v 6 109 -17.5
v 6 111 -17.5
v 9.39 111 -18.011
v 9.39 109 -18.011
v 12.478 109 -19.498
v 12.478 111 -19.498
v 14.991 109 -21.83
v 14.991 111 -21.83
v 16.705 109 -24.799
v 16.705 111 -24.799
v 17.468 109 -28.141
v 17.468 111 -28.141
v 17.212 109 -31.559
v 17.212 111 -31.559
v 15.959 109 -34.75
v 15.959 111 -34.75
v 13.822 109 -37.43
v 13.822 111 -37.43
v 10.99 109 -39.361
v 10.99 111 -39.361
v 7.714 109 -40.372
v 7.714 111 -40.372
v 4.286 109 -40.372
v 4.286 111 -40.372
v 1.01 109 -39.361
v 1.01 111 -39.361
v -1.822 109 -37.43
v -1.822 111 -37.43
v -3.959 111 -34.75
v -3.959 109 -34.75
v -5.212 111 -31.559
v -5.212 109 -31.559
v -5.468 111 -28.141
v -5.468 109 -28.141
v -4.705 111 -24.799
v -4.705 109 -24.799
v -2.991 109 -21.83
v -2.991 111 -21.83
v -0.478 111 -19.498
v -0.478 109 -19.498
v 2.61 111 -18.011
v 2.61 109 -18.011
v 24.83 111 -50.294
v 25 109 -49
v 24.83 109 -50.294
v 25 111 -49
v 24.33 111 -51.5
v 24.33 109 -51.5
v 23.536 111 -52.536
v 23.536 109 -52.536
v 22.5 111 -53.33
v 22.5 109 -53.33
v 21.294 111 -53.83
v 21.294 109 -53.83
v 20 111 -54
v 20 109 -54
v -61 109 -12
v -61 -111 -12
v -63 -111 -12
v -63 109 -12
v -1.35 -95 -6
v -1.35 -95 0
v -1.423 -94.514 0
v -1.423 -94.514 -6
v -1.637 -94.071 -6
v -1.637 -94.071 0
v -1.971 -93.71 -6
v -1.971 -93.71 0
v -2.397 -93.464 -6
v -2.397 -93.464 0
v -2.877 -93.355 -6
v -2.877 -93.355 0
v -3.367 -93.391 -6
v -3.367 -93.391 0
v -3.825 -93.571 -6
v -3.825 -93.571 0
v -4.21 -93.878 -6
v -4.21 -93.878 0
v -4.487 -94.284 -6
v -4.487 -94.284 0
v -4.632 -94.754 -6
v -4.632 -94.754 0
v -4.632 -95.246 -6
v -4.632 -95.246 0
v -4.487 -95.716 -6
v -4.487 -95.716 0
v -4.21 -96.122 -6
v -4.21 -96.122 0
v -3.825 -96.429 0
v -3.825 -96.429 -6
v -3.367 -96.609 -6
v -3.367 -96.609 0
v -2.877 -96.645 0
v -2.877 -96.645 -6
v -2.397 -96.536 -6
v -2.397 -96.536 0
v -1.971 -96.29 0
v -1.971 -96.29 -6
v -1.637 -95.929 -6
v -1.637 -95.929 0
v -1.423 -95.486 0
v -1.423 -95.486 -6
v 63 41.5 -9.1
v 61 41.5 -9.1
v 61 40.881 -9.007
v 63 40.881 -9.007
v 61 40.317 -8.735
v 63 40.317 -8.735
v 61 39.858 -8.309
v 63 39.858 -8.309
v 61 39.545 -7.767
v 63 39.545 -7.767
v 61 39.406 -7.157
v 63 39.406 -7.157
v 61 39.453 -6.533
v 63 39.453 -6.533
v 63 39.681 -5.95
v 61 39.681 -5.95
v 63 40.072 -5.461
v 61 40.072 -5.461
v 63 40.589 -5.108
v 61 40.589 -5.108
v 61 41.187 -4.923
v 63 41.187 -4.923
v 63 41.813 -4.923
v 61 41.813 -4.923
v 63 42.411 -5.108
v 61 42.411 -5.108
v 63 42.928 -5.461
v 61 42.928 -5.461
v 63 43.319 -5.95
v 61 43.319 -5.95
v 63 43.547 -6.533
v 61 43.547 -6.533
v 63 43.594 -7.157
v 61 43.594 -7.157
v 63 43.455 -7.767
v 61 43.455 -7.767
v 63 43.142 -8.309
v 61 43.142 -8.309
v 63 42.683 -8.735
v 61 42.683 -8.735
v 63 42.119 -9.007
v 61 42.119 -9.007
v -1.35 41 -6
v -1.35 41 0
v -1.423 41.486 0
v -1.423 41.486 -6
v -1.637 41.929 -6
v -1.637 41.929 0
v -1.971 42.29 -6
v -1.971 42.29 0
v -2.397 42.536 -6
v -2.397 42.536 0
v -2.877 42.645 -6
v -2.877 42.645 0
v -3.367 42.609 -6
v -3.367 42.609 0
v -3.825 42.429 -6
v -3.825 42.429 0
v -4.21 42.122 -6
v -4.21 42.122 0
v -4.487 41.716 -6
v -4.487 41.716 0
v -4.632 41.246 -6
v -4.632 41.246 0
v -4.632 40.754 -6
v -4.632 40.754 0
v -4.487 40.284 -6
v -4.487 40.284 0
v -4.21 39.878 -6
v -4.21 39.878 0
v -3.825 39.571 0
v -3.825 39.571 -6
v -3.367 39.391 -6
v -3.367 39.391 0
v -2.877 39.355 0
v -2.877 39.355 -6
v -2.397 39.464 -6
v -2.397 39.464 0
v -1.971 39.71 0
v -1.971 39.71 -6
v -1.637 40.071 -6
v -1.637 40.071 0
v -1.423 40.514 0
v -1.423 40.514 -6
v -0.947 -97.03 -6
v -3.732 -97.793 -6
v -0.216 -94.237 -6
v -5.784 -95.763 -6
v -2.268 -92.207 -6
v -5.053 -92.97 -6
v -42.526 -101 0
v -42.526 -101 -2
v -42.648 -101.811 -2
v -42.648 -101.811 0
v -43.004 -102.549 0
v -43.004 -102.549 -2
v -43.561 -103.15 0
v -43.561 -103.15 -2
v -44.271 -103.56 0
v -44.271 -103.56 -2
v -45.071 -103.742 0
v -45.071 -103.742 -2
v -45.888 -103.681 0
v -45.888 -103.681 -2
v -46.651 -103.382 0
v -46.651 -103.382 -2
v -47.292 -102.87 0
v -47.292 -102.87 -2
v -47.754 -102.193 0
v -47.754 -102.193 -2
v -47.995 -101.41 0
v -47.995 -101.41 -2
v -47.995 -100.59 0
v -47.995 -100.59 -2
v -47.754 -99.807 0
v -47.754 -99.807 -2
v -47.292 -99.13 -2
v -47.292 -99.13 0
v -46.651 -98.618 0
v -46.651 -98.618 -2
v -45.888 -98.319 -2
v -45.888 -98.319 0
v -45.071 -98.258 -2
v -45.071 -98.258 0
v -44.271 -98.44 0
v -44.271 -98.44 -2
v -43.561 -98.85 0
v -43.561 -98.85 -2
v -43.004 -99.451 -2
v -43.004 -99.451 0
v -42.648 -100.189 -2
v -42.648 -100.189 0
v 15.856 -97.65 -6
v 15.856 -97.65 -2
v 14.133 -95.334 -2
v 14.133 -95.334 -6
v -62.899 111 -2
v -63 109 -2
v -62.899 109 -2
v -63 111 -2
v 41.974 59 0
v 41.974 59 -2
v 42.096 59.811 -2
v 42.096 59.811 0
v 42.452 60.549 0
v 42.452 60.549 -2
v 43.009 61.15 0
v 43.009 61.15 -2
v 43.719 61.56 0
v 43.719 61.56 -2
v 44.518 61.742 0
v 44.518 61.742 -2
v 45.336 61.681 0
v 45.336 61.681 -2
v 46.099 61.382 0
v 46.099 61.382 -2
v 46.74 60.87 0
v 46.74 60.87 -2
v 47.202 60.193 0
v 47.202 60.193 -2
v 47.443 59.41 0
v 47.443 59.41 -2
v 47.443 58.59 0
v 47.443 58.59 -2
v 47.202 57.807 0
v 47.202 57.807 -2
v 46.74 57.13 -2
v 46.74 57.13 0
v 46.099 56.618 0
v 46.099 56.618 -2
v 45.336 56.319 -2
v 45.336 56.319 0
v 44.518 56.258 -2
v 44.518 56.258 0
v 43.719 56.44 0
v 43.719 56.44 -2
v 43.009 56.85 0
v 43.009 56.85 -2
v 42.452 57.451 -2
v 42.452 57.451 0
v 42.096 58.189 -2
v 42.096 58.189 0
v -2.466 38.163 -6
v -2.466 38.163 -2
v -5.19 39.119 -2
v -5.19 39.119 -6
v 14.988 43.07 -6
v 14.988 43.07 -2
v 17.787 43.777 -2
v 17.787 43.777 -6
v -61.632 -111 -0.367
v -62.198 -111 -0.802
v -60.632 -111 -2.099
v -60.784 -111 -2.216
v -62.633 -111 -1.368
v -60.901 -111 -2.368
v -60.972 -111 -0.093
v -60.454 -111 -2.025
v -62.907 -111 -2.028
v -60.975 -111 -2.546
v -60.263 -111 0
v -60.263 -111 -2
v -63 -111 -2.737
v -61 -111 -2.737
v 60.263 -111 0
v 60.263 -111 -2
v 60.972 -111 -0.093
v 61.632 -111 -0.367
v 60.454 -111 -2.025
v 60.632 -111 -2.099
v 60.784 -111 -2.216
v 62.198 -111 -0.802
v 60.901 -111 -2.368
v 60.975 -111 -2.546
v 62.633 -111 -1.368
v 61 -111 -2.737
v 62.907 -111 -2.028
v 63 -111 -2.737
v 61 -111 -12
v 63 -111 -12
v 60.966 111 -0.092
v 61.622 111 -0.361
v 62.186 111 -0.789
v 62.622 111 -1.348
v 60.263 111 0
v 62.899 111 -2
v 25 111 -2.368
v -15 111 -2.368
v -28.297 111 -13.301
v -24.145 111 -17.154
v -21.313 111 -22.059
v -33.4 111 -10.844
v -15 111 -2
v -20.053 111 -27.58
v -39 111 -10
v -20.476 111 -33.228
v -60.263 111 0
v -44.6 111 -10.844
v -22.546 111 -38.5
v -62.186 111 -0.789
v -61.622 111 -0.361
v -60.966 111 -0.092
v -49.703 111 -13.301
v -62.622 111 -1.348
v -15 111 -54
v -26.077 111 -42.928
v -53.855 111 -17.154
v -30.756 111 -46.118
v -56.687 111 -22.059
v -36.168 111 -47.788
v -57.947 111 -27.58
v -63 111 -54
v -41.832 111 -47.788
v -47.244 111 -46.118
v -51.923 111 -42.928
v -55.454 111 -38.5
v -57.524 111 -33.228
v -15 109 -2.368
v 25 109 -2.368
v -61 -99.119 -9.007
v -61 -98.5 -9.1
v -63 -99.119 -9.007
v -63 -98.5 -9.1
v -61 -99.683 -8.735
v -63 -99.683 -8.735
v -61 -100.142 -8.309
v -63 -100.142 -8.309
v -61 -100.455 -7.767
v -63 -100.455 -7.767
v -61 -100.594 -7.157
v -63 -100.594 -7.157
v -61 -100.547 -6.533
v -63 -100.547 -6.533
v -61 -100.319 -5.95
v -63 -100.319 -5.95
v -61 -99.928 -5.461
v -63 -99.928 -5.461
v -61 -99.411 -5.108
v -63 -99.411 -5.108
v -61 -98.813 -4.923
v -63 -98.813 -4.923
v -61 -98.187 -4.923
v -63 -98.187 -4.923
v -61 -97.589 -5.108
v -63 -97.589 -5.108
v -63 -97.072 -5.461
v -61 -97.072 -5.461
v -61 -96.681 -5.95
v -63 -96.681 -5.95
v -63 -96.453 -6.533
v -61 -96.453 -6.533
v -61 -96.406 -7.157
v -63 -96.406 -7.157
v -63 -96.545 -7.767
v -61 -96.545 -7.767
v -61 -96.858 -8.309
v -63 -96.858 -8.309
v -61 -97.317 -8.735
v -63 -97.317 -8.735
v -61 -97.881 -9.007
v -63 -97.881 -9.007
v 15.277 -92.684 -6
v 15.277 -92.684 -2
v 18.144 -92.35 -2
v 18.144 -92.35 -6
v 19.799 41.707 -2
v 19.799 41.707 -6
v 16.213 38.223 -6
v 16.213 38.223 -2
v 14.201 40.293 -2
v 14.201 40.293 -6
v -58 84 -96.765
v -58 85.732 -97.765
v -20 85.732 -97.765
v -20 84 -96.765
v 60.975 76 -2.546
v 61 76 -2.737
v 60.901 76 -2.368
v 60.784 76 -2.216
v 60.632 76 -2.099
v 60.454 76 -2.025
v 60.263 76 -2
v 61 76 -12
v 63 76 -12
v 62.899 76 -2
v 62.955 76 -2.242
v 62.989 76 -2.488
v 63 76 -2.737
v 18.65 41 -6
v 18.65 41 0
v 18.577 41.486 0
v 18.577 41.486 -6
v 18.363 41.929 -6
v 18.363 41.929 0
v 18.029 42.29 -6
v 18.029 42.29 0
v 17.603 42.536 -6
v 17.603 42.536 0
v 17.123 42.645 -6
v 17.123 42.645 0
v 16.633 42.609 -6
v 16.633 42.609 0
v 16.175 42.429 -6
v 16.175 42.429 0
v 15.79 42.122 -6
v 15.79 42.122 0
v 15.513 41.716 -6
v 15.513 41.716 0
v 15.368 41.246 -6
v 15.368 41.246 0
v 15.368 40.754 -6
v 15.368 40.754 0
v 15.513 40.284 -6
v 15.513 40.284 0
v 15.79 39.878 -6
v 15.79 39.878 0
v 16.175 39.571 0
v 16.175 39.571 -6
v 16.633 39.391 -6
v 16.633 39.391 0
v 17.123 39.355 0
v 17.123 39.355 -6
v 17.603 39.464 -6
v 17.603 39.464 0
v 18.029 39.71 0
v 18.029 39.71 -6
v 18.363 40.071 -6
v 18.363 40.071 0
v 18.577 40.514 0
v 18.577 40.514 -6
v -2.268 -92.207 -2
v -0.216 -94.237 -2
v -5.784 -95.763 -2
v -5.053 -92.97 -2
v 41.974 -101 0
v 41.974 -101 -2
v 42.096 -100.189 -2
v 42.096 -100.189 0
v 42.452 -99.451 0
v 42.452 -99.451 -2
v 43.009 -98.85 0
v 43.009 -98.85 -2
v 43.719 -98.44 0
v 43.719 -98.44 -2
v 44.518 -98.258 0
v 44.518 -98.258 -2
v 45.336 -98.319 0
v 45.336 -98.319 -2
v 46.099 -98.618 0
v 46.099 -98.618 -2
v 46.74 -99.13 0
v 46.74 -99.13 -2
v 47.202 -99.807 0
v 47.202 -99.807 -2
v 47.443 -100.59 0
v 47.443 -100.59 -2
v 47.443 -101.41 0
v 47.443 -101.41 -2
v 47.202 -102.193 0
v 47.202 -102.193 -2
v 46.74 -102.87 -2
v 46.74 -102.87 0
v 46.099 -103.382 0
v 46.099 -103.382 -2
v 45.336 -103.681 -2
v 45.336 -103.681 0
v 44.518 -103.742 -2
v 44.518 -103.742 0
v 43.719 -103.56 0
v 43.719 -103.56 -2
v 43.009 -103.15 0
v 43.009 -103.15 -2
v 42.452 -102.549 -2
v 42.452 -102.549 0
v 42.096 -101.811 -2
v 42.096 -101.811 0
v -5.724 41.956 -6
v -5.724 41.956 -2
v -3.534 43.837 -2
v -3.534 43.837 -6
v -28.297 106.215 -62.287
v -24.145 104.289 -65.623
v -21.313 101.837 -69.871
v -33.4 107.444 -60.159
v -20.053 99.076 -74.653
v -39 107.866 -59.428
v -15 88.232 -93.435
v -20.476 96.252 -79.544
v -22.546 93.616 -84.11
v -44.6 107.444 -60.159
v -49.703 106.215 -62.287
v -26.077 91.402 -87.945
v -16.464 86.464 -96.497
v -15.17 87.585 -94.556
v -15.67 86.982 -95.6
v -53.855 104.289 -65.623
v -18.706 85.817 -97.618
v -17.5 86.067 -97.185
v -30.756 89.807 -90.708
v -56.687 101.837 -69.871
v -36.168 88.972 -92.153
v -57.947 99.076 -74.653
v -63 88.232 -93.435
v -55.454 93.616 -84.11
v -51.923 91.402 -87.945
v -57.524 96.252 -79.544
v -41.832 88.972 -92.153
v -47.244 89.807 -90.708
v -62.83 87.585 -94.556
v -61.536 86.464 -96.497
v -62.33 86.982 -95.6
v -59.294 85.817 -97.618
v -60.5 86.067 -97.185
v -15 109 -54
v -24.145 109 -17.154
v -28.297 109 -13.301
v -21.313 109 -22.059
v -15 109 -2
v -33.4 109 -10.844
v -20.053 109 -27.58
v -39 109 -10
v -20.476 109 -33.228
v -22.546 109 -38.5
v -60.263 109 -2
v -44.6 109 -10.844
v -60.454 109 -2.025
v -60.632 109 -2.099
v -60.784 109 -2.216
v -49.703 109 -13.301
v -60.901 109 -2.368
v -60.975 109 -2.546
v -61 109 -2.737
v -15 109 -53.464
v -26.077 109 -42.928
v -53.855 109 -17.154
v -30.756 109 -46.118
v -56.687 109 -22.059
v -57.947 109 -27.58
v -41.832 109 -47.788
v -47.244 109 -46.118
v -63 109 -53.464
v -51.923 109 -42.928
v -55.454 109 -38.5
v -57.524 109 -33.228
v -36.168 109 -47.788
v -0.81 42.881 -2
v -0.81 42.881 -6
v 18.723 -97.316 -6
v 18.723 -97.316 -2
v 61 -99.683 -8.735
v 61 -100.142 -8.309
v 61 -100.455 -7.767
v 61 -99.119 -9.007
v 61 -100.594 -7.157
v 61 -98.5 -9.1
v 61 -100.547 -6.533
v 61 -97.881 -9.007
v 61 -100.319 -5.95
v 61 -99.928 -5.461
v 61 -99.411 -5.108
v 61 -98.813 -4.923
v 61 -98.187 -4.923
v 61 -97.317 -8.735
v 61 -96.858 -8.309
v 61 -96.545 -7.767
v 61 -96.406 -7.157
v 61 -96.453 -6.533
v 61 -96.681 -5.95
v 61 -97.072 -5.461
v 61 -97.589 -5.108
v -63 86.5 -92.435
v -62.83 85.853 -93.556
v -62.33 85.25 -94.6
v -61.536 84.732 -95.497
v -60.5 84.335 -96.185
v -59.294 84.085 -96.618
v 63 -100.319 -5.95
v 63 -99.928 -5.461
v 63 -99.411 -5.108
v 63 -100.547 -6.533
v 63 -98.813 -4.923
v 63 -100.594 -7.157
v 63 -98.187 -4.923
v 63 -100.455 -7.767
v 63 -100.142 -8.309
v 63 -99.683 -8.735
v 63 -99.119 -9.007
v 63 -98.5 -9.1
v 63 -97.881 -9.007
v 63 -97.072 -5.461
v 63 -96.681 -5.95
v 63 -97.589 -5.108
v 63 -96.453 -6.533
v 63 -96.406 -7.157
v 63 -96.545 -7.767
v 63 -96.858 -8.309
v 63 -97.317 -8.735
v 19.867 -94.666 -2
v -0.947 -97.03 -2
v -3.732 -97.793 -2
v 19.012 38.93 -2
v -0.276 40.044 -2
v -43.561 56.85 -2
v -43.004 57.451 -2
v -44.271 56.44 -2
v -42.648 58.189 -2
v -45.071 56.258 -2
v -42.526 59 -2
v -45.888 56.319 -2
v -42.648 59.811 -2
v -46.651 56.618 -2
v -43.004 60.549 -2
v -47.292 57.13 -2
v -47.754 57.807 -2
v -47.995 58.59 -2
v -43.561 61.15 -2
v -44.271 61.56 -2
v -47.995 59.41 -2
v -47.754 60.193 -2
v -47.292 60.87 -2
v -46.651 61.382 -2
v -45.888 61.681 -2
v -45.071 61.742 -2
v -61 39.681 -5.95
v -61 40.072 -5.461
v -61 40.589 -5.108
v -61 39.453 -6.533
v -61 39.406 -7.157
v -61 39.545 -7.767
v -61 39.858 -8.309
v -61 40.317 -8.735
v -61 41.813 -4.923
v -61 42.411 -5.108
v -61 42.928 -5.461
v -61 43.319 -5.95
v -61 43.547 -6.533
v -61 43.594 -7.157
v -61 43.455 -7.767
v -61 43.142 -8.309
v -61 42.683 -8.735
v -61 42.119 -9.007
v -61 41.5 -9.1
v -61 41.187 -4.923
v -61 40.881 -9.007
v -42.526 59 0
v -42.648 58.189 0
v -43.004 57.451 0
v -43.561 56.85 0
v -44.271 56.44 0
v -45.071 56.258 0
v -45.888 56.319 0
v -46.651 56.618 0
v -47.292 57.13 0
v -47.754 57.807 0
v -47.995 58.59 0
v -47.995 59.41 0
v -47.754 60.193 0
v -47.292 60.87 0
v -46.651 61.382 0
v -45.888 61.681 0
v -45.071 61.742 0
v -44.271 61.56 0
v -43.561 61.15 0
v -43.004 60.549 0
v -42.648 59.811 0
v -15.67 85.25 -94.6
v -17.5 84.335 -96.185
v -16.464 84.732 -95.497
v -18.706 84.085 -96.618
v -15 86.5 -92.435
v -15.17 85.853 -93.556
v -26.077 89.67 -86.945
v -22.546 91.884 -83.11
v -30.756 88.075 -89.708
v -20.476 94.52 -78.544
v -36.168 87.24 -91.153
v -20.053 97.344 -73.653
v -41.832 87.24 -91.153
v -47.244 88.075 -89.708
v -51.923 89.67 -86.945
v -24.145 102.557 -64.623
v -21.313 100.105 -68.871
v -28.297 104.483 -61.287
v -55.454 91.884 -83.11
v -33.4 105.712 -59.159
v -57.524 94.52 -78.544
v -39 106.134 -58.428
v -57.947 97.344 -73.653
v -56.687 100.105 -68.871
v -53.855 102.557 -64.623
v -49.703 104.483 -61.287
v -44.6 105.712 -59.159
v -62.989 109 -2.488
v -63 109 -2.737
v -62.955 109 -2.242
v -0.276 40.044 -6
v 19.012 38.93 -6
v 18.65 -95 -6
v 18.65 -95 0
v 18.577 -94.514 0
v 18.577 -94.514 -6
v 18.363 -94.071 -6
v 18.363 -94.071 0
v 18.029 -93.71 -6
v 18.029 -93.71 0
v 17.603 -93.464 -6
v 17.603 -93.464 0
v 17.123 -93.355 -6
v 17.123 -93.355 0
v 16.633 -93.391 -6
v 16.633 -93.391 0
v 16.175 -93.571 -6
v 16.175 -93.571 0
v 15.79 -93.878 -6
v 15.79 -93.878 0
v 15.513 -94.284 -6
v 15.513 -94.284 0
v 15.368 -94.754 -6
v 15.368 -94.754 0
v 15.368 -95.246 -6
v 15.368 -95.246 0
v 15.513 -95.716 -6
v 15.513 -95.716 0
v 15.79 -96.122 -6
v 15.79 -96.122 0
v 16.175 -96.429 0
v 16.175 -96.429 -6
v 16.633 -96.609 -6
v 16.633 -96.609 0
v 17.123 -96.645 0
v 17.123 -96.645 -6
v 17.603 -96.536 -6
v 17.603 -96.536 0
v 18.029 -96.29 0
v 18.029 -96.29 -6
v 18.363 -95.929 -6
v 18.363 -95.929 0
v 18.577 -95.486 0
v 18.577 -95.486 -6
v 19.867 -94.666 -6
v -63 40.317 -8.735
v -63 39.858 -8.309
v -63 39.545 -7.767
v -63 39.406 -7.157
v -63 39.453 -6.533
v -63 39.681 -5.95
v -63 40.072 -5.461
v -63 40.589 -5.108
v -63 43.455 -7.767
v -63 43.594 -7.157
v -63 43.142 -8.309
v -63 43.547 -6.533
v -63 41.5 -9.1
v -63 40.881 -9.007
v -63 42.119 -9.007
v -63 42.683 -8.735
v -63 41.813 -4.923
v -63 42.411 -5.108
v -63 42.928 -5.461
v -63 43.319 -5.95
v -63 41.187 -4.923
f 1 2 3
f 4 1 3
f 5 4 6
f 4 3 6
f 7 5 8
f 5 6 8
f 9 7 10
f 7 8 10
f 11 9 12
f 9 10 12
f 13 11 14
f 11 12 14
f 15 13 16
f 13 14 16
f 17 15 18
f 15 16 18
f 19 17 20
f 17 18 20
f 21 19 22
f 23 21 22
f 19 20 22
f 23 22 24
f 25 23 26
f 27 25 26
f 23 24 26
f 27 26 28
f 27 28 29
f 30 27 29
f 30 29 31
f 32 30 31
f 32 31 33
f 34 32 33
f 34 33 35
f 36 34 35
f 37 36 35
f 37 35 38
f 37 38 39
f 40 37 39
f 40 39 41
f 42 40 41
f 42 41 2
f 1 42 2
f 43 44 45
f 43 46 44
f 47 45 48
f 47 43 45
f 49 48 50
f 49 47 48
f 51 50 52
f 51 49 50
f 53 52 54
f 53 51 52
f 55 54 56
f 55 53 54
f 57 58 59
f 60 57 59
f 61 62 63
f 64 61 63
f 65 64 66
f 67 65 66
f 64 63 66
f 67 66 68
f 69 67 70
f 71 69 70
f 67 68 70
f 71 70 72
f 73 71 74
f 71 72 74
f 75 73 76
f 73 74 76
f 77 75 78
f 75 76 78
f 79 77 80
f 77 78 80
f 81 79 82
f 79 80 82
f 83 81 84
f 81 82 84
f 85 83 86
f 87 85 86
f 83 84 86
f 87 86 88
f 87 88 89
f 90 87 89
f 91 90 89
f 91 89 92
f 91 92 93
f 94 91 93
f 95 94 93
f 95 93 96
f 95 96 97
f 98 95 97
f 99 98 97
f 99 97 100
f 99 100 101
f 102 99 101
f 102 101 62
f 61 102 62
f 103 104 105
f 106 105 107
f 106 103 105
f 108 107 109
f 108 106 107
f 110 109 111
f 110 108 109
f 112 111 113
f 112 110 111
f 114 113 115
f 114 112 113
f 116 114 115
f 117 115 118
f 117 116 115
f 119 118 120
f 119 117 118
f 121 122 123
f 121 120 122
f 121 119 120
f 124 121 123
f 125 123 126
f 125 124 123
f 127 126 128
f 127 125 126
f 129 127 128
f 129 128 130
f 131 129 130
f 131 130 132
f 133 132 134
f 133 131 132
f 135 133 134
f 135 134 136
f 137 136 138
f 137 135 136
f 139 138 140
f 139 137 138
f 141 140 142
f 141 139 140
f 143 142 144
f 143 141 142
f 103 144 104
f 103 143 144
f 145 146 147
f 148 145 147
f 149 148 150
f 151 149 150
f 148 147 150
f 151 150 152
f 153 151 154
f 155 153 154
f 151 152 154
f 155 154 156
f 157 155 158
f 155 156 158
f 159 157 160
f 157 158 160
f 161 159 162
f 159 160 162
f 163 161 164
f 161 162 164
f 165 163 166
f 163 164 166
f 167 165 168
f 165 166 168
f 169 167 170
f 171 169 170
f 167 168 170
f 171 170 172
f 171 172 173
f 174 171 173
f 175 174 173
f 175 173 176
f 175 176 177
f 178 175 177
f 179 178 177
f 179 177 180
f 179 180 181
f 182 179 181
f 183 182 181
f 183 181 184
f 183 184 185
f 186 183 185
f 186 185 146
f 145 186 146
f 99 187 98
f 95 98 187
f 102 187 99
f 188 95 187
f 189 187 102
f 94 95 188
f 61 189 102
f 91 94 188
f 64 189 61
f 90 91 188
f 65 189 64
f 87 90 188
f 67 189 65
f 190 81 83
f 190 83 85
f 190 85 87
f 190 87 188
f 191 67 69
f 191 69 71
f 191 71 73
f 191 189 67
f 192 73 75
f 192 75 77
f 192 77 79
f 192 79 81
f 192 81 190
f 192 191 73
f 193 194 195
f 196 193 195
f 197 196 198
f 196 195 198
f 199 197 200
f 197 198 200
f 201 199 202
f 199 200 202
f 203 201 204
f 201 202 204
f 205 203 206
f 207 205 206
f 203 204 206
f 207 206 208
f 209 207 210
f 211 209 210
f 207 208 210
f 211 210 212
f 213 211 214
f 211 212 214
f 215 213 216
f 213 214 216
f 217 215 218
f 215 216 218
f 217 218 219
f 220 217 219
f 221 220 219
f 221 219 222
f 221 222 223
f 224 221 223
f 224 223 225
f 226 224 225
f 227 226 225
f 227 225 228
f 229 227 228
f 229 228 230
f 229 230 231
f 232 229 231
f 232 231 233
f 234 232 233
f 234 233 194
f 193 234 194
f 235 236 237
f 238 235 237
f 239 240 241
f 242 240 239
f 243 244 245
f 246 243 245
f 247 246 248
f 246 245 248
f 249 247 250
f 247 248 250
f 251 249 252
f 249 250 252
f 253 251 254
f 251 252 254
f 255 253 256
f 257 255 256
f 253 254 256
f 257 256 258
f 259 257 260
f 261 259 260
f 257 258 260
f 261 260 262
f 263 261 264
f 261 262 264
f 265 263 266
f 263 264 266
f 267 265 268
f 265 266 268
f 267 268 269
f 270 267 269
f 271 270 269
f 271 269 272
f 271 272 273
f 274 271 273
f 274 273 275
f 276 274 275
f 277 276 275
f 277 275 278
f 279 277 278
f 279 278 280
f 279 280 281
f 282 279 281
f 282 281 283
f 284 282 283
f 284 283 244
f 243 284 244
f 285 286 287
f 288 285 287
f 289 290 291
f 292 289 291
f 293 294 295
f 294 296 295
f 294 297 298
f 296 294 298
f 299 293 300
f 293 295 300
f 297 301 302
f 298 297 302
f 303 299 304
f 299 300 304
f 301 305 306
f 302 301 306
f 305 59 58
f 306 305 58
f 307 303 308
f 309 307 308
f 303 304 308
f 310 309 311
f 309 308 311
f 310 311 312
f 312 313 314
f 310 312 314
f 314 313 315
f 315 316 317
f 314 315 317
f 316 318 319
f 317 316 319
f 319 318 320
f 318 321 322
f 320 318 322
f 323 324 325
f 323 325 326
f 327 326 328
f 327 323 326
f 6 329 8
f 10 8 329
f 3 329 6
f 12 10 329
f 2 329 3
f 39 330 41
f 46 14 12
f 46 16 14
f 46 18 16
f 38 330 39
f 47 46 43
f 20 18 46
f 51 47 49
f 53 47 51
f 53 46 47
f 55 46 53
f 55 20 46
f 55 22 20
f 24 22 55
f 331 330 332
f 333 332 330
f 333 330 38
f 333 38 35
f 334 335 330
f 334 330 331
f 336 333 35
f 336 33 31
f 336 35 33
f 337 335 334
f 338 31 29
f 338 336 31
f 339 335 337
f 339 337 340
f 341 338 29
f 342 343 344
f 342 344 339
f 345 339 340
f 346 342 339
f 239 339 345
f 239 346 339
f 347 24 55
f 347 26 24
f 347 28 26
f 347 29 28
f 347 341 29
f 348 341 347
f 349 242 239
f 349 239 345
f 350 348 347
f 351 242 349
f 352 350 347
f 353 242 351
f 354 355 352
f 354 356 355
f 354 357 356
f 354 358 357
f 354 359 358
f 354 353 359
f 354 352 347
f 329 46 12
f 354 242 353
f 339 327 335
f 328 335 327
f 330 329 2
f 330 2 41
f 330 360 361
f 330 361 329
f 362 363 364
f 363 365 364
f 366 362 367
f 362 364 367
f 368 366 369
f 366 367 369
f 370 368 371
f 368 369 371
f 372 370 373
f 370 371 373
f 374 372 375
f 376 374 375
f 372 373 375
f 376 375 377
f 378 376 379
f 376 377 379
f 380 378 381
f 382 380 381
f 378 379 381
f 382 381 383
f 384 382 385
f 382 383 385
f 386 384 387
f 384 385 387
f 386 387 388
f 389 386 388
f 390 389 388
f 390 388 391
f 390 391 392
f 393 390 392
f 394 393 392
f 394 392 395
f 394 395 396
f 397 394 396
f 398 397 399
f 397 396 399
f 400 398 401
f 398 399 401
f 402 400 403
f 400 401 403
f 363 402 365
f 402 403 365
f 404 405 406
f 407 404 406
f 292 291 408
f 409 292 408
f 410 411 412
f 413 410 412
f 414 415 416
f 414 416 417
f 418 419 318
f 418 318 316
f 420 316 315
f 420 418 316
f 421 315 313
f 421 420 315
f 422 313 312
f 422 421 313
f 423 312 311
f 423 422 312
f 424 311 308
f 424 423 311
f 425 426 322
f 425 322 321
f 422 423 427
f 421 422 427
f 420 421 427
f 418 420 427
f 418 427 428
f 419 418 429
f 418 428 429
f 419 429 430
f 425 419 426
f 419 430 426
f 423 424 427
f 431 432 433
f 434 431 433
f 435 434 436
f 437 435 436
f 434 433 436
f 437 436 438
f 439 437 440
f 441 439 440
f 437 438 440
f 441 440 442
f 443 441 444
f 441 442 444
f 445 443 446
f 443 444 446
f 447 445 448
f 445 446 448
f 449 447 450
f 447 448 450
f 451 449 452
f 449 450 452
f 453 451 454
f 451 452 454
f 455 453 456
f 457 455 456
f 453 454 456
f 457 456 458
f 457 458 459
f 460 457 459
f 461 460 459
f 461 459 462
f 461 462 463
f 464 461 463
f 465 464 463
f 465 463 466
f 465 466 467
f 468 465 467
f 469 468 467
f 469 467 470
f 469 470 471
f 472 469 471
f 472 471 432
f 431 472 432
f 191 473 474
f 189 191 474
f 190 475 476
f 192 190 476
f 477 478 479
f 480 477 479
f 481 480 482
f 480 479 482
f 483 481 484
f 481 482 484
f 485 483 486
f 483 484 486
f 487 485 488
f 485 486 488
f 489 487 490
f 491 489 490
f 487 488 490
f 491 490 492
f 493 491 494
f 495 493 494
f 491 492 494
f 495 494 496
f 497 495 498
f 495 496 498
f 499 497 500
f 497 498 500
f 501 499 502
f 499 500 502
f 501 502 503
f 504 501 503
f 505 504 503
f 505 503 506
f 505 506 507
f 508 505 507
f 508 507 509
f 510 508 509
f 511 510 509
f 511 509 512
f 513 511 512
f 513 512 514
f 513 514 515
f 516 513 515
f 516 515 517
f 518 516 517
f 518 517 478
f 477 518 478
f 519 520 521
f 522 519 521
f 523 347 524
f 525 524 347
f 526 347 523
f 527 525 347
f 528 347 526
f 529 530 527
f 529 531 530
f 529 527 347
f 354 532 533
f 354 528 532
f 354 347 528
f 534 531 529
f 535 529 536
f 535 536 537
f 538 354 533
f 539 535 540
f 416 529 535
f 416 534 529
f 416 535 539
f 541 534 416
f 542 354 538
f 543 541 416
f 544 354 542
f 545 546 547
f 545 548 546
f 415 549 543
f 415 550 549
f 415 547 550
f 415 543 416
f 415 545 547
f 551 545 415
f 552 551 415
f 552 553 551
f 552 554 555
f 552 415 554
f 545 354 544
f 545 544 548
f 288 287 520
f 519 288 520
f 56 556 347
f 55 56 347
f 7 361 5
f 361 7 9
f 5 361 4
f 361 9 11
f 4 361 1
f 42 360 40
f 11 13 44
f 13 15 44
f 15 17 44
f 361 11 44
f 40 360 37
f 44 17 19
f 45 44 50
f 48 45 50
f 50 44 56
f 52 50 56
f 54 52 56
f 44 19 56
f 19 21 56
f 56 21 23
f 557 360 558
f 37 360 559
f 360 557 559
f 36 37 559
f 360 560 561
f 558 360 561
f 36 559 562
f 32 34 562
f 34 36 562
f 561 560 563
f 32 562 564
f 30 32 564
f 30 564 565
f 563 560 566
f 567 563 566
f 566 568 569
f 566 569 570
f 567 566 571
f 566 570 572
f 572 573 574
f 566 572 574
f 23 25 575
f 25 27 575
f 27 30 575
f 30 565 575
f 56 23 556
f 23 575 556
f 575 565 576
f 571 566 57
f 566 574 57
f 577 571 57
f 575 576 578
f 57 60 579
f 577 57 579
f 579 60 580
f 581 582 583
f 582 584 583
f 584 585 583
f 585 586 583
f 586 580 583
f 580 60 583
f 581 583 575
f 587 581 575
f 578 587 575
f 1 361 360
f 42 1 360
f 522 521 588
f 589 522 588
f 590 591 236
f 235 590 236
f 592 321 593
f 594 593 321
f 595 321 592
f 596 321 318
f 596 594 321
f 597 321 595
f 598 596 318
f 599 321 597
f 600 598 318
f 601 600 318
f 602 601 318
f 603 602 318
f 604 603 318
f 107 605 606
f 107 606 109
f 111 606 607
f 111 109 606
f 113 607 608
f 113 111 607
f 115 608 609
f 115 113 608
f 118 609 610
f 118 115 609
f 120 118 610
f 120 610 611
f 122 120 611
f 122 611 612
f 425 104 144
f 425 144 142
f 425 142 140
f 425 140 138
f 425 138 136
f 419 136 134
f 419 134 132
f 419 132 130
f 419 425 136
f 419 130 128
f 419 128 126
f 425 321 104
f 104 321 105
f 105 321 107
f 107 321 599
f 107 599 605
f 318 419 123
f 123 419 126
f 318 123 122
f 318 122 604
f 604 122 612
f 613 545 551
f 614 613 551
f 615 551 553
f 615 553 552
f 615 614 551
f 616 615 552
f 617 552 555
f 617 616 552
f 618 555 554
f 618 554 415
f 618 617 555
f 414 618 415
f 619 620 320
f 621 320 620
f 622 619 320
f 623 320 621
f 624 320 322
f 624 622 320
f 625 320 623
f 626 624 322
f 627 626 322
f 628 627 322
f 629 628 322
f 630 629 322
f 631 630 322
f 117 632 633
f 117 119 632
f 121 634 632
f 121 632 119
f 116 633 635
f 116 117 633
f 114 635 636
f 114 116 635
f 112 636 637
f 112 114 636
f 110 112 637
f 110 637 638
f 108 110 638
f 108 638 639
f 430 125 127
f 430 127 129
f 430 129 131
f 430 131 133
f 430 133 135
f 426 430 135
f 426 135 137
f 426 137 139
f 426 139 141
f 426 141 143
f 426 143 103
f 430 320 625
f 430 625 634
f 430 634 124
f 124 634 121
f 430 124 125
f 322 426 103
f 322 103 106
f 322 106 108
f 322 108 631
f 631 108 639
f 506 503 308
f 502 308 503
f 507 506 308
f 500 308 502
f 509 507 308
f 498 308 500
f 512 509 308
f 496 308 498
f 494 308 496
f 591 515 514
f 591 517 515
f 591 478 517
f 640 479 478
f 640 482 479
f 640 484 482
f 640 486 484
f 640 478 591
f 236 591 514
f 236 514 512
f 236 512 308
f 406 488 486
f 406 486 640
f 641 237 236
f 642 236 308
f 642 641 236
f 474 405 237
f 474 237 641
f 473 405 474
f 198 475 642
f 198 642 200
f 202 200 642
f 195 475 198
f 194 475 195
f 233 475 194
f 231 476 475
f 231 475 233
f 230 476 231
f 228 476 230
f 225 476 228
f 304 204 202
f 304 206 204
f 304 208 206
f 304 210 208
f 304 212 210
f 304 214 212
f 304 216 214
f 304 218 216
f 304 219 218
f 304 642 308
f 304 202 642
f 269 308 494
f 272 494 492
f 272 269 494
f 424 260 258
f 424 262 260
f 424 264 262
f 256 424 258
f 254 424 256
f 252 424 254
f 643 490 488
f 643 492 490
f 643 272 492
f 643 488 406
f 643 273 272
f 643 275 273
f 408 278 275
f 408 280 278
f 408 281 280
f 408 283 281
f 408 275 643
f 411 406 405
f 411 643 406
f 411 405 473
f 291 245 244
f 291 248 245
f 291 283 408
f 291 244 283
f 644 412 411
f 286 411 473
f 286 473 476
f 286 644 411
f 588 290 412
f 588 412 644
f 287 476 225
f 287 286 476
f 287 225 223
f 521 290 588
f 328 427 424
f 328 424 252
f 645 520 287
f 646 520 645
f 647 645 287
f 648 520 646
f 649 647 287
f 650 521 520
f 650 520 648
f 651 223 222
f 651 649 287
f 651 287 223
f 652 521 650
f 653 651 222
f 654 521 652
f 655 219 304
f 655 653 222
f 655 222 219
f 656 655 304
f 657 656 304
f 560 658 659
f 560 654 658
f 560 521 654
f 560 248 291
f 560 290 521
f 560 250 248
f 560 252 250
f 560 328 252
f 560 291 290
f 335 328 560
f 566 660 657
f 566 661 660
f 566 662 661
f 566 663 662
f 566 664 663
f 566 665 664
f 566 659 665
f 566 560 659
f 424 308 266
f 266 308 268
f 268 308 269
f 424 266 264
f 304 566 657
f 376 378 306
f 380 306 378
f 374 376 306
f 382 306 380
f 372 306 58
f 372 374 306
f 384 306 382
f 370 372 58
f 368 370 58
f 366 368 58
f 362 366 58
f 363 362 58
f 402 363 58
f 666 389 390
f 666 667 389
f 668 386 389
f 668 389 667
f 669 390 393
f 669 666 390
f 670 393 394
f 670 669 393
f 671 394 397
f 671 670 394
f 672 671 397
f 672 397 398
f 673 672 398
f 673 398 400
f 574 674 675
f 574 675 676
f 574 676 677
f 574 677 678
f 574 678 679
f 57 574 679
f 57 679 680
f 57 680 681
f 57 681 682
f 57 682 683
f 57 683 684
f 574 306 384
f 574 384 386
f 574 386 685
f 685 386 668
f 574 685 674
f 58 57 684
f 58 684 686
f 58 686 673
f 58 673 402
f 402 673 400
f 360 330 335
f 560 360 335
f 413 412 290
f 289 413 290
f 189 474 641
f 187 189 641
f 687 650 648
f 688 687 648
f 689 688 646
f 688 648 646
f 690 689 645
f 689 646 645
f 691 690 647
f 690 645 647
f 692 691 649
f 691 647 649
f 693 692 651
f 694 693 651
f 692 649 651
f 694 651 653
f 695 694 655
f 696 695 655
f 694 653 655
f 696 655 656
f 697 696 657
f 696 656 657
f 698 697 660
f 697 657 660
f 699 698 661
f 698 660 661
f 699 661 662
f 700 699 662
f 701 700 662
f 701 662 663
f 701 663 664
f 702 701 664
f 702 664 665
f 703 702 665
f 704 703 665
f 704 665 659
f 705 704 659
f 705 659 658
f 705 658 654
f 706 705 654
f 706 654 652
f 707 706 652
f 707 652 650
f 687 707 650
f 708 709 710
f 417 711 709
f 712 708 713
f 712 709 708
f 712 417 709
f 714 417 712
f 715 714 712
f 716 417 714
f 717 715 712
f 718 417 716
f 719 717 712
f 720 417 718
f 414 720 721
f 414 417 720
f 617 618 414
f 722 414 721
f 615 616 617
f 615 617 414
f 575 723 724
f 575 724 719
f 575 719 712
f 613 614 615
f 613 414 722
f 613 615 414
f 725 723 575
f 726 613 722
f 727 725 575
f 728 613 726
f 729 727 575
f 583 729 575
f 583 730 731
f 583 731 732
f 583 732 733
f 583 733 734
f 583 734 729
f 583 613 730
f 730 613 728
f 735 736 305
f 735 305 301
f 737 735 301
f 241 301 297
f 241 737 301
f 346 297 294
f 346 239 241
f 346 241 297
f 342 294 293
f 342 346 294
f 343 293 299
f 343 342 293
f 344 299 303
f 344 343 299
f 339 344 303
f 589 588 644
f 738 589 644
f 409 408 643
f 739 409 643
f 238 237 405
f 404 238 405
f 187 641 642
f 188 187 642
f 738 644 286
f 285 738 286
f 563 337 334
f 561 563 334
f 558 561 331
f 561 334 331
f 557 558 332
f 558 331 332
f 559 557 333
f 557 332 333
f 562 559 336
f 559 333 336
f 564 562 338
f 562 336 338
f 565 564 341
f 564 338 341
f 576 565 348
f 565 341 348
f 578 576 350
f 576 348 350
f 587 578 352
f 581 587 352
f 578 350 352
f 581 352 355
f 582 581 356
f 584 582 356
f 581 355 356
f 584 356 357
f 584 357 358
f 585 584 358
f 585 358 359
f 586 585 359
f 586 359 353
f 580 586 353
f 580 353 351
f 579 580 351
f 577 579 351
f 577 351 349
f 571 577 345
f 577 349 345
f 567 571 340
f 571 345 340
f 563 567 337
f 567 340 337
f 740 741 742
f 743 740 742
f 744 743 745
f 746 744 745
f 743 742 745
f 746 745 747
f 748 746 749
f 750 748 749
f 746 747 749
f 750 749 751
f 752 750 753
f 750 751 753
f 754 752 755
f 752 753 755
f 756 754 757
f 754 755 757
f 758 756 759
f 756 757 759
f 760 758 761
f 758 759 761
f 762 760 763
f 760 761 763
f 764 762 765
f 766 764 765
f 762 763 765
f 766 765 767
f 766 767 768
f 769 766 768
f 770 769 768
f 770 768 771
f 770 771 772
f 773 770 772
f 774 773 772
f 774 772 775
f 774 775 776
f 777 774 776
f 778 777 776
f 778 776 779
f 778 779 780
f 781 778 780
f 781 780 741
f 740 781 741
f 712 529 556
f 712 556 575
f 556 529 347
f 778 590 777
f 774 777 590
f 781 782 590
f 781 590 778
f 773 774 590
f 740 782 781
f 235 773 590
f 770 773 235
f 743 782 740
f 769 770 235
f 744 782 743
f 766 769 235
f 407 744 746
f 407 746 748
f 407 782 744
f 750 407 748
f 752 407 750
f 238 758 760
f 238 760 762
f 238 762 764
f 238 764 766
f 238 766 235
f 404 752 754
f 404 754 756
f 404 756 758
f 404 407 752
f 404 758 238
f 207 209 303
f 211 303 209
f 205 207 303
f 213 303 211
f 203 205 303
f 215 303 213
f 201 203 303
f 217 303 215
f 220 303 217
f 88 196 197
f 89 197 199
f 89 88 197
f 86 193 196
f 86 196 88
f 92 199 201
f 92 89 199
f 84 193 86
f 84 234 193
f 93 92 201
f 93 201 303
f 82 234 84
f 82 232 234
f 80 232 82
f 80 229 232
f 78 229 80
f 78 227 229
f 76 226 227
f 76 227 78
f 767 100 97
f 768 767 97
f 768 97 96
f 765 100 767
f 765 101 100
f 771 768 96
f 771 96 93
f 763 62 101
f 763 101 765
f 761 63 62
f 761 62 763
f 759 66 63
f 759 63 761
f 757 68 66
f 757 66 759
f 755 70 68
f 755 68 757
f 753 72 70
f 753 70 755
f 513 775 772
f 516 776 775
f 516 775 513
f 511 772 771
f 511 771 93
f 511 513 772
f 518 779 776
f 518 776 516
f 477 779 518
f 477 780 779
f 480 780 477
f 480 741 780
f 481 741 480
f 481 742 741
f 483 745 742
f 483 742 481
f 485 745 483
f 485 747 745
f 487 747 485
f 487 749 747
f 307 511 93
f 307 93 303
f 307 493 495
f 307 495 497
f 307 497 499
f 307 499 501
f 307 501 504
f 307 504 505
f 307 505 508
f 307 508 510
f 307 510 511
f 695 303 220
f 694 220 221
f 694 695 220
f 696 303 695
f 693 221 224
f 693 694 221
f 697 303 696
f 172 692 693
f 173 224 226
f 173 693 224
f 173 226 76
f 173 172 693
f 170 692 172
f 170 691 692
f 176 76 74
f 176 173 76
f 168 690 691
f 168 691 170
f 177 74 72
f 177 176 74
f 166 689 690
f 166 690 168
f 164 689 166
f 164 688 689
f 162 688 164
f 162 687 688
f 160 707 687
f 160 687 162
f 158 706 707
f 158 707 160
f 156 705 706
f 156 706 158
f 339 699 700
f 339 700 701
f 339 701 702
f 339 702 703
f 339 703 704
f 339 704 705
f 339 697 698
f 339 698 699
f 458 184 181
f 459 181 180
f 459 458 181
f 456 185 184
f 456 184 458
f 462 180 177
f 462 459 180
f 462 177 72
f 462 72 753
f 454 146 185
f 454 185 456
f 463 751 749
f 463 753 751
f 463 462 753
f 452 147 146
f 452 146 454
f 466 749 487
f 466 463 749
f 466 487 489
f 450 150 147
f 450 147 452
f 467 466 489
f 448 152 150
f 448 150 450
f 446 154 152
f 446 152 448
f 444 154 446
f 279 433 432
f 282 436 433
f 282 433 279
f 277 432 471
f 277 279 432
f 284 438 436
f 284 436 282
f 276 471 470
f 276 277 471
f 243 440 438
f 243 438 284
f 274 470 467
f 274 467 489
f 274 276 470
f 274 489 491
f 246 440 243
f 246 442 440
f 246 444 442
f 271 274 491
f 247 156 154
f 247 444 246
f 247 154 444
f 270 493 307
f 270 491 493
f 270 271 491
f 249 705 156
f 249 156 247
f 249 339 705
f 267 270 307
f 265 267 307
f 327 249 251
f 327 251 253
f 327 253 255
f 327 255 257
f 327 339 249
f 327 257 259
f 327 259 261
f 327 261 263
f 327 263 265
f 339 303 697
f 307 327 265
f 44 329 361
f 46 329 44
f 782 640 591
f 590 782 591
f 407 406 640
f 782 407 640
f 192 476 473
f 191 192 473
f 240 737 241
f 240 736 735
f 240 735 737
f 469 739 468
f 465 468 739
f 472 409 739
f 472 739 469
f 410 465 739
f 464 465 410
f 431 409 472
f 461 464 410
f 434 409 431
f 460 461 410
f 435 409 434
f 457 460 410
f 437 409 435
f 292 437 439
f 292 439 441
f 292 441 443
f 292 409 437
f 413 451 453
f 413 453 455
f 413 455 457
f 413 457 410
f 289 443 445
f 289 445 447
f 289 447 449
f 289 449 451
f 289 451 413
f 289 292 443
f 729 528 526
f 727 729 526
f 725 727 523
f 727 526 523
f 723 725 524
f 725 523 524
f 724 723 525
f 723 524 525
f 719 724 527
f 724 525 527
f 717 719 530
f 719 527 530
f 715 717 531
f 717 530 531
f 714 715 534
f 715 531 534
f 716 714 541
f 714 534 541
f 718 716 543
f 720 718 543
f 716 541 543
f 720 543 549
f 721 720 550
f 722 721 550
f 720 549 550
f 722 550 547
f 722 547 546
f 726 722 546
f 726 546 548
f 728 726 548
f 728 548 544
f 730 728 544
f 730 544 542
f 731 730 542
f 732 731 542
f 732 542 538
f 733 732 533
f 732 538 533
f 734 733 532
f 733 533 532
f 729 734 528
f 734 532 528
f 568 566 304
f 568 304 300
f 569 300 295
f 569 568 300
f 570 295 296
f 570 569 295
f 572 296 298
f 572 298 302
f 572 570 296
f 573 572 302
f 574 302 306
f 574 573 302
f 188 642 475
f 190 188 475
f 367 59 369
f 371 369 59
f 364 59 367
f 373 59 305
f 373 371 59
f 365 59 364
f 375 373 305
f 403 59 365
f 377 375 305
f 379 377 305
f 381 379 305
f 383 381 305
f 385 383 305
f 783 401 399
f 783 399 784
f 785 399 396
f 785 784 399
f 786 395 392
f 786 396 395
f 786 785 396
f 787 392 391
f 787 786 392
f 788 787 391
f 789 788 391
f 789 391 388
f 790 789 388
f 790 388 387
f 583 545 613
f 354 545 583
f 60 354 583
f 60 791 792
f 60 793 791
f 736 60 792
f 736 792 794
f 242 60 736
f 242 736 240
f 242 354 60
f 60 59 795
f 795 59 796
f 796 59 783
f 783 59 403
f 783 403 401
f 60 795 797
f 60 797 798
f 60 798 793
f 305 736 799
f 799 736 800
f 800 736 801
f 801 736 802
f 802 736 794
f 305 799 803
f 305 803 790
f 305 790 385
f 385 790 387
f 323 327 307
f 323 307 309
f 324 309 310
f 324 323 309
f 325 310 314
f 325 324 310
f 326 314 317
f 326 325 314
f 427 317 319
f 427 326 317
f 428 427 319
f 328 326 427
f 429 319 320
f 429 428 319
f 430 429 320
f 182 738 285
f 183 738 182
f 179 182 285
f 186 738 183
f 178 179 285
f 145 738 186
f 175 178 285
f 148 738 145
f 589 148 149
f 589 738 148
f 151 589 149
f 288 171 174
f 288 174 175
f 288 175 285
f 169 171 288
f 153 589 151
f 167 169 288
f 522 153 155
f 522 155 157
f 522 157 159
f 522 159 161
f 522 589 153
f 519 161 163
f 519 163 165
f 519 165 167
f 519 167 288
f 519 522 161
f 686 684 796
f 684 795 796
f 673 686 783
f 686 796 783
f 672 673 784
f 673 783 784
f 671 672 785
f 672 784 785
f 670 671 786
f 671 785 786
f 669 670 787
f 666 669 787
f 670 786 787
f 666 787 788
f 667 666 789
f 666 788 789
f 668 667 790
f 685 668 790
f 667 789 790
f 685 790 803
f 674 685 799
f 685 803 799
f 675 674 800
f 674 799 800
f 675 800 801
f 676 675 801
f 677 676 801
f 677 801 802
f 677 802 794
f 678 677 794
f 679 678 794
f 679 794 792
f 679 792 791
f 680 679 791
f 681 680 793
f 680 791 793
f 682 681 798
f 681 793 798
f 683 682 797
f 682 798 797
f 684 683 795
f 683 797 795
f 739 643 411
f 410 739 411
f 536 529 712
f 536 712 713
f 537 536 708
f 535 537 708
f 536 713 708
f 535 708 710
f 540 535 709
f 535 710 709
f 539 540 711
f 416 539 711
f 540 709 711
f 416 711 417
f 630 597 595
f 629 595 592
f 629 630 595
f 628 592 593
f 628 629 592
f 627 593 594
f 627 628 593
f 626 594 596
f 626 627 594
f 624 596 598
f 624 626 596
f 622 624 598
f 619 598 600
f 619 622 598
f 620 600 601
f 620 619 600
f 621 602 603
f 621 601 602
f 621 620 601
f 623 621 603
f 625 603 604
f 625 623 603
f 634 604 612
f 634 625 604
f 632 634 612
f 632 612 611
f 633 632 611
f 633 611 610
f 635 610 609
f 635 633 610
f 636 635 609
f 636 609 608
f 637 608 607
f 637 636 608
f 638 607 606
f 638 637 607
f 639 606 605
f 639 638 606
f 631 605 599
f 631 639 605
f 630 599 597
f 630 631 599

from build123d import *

# Parameters (mm, degrees)
SM_BASE_FLANGE_1_DEPTH = 111
CUT_EXTRUDE_1_REACH    = 170.348
SKETCH_3_W             = 10
SKETCH_3_H             = 35
EXTRUDE_1_DEPTH        = 4
M4X0_7_1_D             = 3.3
SKETCH_8_R             = 2.75
CUT_EXTRUDE_2_DEPTH    = 129.023435355
M5X0_8_1_AT_2_COUNT    = 2
M5X0_8_1_AT_2_PITCH    = 140
EXTRUDE_2_DEPTH        = 48
SKETCH_12_R            = 19
CUT_EXTRUDE_3_DEPTH    = 2
SKETCH_13_R            = 19
CUT_EXTRUDE_4_DEPTH    = 2
FILLET_1_R             = 5
SKETCH_14_W            = 51.6317
SKETCH_14_H            = 2
EXTRUDE_3_DEPTH        = 40
CUT_EXTRUDE_5_REACH    = 252.621
SKETCH_15_R            = 11.5
FILLET_2_R             = 5


# Sheet-metal steps are written as plain solids
with BuildPart() as part:
    # Sketch 1 → 基体-法兰1 (new, symmetric)
    with BuildSketch(Plane(origin=(0, 0, 0), x_dir=(1, 0, 0), z_dir=(0, 1, 0))):
        with BuildLine():
            Line((-63, 12), (-63, 2.7366))
            ThreePointArc((-63, 2.7366), (-62.198468417, 0.801531583), (-60.2634, 0))
            Line((-60.2634, 0), (60.2634, 0))
            ThreePointArc((60.2634, 0), (62.198468417, 0.801531583), (63, 2.7366))
            Line((63, 2.7366), (63, 12))
            Line((63, 12), (61, 12))
            Line((61, 12), (61, 2.7366))
            ThreePointArc((61, 2.7366), (60.784254855, 2.215745145), (60.2634, 2))
            Line((60.2634, 2), (-60.2634, 2))
            ThreePointArc((-60.2634, 2), (-60.784254855, 2.215745145), (-61, 2.7366))
            Line((-61, 2.7366), (-61, 12))
            Line((-61, 12), (-63, 12))
        make_face()
    extrude(amount=SM_BASE_FLANGE_1_DEPTH, both=True)

    # 草图3 → 切除-拉伸1 (cut, up to next)
    with BuildSketch(Plane(origin=(63, 0, 0), x_dir=(0, 0, -1), z_dir=(1, 0, 0)), mode=Mode.PRIVATE) as cut_extrude_1_sk1:
        with Locations((7, 93.5)):
            Rectangle(SKETCH_3_W, SKETCH_3_H)
    cut_extrude_1_tool1 = extrude(cut_extrude_1_sk1.sketch, amount=-CUT_EXTRUDE_1_REACH, mode=Mode.PRIVATE) & part.part
    add(cut_extrude_1_tool1.solids().sort_by_distance((63, 93.5, -7))[0], mode=Mode.SUBTRACT)

    # 草图4 → 凸台-拉伸1 (add)
    with BuildSketch(Plane(origin=(0, 0, -2), x_dir=(-1, 0, 0), z_dir=(0, 0, -1))):
        Polygon((-14.987954458, 43.07002562), (-17.786672003, 43.777495363), (-19.798717545, 41.707469743), (-19.012045542, 38.92997438), (-16.213327997, 38.222504637), (-14.201282455, 40.292530257), align=None)
        Polygon((5.723956961, 41.955715338), (3.534304719, 43.836873596), (0.810347758, 42.881158258), (0.276043039, 40.044284662), (2.465695281, 38.163126404), (5.189652242, 39.118841742), align=None)
        Polygon((-15.276915043, -92.683901651), (-18.14425753, -92.34971548), (-19.867342487, -94.665813829), (-18.723084957, -97.316098349), (-15.85574247, -97.65028452), (-14.132657513, -95.334186171), align=None)
        Polygon((5.052579277, -92.9701597), (2.268396373, -92.207494053), (0.215817096, -94.237334353), (0.947420723, -97.0298403), (3.731603627, -97.792505947), (5.784182904, -95.762665647), align=None)
    extrude(amount=EXTRUDE_1_DEPTH)

    # M4x0.7 螺纹孔1 (through all)
    with Locations(Plane(origin=(0, 0, -6), x_dir=(-1, 0, 0), z_dir=(0, 0, -1))):
        with Locations((-17, 41), (3, 41), (-17, -95), (3, -95)):
            Hole(M4X0_7_1_D / 2)

    # 草图8 → 切除-拉伸2 (cut, through all)
    with BuildSketch(Plane(origin=(0, 0, -2), x_dir=(-1, 0, 0), z_dir=(0, 0, -1))):
        with Locations((-44.723956961, 59)):
            Circle(SKETCH_8_R)
        with Locations(Location((45.276043039, 59, 0), (0, 0, 180))):
            Circle(SKETCH_8_R)
        with Locations((-44.723956961, -101)):
            Circle(SKETCH_8_R)
        with Locations(Location((45.276043039, -101, 0), (0, 0, 180))):
            Circle(SKETCH_8_R)
    extrude(amount=-CUT_EXTRUDE_2_DEPTH, mode=Mode.SUBTRACT)

    # 草图9 → M5x0.8 螺纹孔1 (revolve, cut)
    with BuildSketch(Plane(origin=(63, -98.5, -7), x_dir=(0, 0, -1), z_dir=(0, 1, 0))):
        Polygon((0, 0), (0, 13.6618073), (2.1, 12.4), (2.1, 0), align=None)
    m5x0_8_1 = revolve(axis=Axis((69.35, -98.5, -7), (-1, 0, 0)), mode=Mode.SUBTRACT)

    # M5x0.8 螺纹孔1 at 2: M5x0.8 螺纹孔1 ×2
    with Locations(*[(0, i * M5X0_8_1_AT_2_PITCH, 0) for i in range(1, M5X0_8_1_AT_2_COUNT)]):
        add(m5x0_8_1, mode=Mode.SUBTRACT)

    # 镜向1: M5x0.8 螺纹孔1 across plane
    add(m5x0_8_1.mirror(Plane(origin=(0, 0, 0), x_dir=(0, 0, 1), z_dir=(1, 0, 0))), mode=Mode.SUBTRACT)

    # 镜向1 copy 1 sketch → 镜向1 copy 1 (revolve, cut)
    with BuildSketch(Plane(origin=(-63, 41.5, -7), x_dir=(0, 0, -1), z_dir=(0, 1, 0))):
        Polygon((0, 0), (0, -13.6618073), (2.1, -12.4), (2.1, 0), align=None)
    revolve(axis=Axis((-69.35, 41.5, -7), (-1, 0, 0)), mode=Mode.SUBTRACT)

    # 草图11 → 凸台-拉伸2 (add)
    with BuildSketch(Plane.ZY.offset(63)):
        Polygon((-2, 111), (-54, 111), (-97.765371804, 85.732050808), (-96.765371804, 84), (-53.464101615, 109), (-2, 109), align=None)
    extrude(amount=-EXTRUDE_2_DEPTH)

    # 草图12 → 切除-拉伸3 (cut)
    with BuildSketch(Plane(origin=(0, 111, 0), x_dir=(1, 0, 0), z_dir=(0, 1, 0))):
        with Locations(Location((-39, 29, 0), (0, 0, 270))):
            Circle(SKETCH_12_R)
    extrude(amount=-CUT_EXTRUDE_3_DEPTH, mode=Mode.SUBTRACT)

    # 草图13 → 切除-拉伸4 (cut)
    with BuildSketch(Plane(origin=(0, 106.632685902, -61.56440991), x_dir=(1, 0, 0), z_dir=(0, 0.8660254037844386, -0.5000000000000001))):
        with Locations(Location((-39, 16.533320997, 0), (0, 0, 270))):
            Circle(SKETCH_13_R)
    extrude(amount=-CUT_EXTRUDE_4_DEPTH, mode=Mode.SUBTRACT)

    # 圆角1
    fillet_1_edges = [part.edges().sort_by_distance(p)[0] for p in [
        (-63, 84.866025404, -97.265371804),
        (-15, 84.866025404, -97.265371804),
    ]]
    fillet(fillet_1_edges, radius=FILLET_1_R)

    # 草图14 → 凸台-拉伸3 (add)
    with BuildSketch(Plane(origin=(-15, 0, 0), x_dir=(0, 0, -1), z_dir=(1, 0, 0))):
        with Locations((28.18415, 110)):
            Rectangle(SKETCH_14_W, SKETCH_14_H)
    extrude(amount=EXTRUDE_3_DEPTH)

    # 草图15 → 切除-拉伸5 (cut, up to next)
    with BuildSketch(Plane(origin=(0, 111, 0), x_dir=(1, 0, 0), z_dir=(0, 1, 0)), mode=Mode.PRIVATE) as cut_extrude_5_sk1:
        with Locations(Location((6, 29, 0), (0, 0, 270))):
            Circle(SKETCH_15_R)
    cut_extrude_5_tool1 = extrude(cut_extrude_5_sk1.sketch, amount=-CUT_EXTRUDE_5_REACH, mode=Mode.PRIVATE) & part.part
    add(cut_extrude_5_tool1.solids().sort_by_distance((6, 111, -29))[0], mode=Mode.SUBTRACT)

    # 圆角2
    fillet_2_edges = [part.edges().sort_by_distance(p)[0] for p in [
        (25, 110, -54),
    ]]
    fillet(fillet_2_edges, radius=FILLET_2_R)


solid = part.part
